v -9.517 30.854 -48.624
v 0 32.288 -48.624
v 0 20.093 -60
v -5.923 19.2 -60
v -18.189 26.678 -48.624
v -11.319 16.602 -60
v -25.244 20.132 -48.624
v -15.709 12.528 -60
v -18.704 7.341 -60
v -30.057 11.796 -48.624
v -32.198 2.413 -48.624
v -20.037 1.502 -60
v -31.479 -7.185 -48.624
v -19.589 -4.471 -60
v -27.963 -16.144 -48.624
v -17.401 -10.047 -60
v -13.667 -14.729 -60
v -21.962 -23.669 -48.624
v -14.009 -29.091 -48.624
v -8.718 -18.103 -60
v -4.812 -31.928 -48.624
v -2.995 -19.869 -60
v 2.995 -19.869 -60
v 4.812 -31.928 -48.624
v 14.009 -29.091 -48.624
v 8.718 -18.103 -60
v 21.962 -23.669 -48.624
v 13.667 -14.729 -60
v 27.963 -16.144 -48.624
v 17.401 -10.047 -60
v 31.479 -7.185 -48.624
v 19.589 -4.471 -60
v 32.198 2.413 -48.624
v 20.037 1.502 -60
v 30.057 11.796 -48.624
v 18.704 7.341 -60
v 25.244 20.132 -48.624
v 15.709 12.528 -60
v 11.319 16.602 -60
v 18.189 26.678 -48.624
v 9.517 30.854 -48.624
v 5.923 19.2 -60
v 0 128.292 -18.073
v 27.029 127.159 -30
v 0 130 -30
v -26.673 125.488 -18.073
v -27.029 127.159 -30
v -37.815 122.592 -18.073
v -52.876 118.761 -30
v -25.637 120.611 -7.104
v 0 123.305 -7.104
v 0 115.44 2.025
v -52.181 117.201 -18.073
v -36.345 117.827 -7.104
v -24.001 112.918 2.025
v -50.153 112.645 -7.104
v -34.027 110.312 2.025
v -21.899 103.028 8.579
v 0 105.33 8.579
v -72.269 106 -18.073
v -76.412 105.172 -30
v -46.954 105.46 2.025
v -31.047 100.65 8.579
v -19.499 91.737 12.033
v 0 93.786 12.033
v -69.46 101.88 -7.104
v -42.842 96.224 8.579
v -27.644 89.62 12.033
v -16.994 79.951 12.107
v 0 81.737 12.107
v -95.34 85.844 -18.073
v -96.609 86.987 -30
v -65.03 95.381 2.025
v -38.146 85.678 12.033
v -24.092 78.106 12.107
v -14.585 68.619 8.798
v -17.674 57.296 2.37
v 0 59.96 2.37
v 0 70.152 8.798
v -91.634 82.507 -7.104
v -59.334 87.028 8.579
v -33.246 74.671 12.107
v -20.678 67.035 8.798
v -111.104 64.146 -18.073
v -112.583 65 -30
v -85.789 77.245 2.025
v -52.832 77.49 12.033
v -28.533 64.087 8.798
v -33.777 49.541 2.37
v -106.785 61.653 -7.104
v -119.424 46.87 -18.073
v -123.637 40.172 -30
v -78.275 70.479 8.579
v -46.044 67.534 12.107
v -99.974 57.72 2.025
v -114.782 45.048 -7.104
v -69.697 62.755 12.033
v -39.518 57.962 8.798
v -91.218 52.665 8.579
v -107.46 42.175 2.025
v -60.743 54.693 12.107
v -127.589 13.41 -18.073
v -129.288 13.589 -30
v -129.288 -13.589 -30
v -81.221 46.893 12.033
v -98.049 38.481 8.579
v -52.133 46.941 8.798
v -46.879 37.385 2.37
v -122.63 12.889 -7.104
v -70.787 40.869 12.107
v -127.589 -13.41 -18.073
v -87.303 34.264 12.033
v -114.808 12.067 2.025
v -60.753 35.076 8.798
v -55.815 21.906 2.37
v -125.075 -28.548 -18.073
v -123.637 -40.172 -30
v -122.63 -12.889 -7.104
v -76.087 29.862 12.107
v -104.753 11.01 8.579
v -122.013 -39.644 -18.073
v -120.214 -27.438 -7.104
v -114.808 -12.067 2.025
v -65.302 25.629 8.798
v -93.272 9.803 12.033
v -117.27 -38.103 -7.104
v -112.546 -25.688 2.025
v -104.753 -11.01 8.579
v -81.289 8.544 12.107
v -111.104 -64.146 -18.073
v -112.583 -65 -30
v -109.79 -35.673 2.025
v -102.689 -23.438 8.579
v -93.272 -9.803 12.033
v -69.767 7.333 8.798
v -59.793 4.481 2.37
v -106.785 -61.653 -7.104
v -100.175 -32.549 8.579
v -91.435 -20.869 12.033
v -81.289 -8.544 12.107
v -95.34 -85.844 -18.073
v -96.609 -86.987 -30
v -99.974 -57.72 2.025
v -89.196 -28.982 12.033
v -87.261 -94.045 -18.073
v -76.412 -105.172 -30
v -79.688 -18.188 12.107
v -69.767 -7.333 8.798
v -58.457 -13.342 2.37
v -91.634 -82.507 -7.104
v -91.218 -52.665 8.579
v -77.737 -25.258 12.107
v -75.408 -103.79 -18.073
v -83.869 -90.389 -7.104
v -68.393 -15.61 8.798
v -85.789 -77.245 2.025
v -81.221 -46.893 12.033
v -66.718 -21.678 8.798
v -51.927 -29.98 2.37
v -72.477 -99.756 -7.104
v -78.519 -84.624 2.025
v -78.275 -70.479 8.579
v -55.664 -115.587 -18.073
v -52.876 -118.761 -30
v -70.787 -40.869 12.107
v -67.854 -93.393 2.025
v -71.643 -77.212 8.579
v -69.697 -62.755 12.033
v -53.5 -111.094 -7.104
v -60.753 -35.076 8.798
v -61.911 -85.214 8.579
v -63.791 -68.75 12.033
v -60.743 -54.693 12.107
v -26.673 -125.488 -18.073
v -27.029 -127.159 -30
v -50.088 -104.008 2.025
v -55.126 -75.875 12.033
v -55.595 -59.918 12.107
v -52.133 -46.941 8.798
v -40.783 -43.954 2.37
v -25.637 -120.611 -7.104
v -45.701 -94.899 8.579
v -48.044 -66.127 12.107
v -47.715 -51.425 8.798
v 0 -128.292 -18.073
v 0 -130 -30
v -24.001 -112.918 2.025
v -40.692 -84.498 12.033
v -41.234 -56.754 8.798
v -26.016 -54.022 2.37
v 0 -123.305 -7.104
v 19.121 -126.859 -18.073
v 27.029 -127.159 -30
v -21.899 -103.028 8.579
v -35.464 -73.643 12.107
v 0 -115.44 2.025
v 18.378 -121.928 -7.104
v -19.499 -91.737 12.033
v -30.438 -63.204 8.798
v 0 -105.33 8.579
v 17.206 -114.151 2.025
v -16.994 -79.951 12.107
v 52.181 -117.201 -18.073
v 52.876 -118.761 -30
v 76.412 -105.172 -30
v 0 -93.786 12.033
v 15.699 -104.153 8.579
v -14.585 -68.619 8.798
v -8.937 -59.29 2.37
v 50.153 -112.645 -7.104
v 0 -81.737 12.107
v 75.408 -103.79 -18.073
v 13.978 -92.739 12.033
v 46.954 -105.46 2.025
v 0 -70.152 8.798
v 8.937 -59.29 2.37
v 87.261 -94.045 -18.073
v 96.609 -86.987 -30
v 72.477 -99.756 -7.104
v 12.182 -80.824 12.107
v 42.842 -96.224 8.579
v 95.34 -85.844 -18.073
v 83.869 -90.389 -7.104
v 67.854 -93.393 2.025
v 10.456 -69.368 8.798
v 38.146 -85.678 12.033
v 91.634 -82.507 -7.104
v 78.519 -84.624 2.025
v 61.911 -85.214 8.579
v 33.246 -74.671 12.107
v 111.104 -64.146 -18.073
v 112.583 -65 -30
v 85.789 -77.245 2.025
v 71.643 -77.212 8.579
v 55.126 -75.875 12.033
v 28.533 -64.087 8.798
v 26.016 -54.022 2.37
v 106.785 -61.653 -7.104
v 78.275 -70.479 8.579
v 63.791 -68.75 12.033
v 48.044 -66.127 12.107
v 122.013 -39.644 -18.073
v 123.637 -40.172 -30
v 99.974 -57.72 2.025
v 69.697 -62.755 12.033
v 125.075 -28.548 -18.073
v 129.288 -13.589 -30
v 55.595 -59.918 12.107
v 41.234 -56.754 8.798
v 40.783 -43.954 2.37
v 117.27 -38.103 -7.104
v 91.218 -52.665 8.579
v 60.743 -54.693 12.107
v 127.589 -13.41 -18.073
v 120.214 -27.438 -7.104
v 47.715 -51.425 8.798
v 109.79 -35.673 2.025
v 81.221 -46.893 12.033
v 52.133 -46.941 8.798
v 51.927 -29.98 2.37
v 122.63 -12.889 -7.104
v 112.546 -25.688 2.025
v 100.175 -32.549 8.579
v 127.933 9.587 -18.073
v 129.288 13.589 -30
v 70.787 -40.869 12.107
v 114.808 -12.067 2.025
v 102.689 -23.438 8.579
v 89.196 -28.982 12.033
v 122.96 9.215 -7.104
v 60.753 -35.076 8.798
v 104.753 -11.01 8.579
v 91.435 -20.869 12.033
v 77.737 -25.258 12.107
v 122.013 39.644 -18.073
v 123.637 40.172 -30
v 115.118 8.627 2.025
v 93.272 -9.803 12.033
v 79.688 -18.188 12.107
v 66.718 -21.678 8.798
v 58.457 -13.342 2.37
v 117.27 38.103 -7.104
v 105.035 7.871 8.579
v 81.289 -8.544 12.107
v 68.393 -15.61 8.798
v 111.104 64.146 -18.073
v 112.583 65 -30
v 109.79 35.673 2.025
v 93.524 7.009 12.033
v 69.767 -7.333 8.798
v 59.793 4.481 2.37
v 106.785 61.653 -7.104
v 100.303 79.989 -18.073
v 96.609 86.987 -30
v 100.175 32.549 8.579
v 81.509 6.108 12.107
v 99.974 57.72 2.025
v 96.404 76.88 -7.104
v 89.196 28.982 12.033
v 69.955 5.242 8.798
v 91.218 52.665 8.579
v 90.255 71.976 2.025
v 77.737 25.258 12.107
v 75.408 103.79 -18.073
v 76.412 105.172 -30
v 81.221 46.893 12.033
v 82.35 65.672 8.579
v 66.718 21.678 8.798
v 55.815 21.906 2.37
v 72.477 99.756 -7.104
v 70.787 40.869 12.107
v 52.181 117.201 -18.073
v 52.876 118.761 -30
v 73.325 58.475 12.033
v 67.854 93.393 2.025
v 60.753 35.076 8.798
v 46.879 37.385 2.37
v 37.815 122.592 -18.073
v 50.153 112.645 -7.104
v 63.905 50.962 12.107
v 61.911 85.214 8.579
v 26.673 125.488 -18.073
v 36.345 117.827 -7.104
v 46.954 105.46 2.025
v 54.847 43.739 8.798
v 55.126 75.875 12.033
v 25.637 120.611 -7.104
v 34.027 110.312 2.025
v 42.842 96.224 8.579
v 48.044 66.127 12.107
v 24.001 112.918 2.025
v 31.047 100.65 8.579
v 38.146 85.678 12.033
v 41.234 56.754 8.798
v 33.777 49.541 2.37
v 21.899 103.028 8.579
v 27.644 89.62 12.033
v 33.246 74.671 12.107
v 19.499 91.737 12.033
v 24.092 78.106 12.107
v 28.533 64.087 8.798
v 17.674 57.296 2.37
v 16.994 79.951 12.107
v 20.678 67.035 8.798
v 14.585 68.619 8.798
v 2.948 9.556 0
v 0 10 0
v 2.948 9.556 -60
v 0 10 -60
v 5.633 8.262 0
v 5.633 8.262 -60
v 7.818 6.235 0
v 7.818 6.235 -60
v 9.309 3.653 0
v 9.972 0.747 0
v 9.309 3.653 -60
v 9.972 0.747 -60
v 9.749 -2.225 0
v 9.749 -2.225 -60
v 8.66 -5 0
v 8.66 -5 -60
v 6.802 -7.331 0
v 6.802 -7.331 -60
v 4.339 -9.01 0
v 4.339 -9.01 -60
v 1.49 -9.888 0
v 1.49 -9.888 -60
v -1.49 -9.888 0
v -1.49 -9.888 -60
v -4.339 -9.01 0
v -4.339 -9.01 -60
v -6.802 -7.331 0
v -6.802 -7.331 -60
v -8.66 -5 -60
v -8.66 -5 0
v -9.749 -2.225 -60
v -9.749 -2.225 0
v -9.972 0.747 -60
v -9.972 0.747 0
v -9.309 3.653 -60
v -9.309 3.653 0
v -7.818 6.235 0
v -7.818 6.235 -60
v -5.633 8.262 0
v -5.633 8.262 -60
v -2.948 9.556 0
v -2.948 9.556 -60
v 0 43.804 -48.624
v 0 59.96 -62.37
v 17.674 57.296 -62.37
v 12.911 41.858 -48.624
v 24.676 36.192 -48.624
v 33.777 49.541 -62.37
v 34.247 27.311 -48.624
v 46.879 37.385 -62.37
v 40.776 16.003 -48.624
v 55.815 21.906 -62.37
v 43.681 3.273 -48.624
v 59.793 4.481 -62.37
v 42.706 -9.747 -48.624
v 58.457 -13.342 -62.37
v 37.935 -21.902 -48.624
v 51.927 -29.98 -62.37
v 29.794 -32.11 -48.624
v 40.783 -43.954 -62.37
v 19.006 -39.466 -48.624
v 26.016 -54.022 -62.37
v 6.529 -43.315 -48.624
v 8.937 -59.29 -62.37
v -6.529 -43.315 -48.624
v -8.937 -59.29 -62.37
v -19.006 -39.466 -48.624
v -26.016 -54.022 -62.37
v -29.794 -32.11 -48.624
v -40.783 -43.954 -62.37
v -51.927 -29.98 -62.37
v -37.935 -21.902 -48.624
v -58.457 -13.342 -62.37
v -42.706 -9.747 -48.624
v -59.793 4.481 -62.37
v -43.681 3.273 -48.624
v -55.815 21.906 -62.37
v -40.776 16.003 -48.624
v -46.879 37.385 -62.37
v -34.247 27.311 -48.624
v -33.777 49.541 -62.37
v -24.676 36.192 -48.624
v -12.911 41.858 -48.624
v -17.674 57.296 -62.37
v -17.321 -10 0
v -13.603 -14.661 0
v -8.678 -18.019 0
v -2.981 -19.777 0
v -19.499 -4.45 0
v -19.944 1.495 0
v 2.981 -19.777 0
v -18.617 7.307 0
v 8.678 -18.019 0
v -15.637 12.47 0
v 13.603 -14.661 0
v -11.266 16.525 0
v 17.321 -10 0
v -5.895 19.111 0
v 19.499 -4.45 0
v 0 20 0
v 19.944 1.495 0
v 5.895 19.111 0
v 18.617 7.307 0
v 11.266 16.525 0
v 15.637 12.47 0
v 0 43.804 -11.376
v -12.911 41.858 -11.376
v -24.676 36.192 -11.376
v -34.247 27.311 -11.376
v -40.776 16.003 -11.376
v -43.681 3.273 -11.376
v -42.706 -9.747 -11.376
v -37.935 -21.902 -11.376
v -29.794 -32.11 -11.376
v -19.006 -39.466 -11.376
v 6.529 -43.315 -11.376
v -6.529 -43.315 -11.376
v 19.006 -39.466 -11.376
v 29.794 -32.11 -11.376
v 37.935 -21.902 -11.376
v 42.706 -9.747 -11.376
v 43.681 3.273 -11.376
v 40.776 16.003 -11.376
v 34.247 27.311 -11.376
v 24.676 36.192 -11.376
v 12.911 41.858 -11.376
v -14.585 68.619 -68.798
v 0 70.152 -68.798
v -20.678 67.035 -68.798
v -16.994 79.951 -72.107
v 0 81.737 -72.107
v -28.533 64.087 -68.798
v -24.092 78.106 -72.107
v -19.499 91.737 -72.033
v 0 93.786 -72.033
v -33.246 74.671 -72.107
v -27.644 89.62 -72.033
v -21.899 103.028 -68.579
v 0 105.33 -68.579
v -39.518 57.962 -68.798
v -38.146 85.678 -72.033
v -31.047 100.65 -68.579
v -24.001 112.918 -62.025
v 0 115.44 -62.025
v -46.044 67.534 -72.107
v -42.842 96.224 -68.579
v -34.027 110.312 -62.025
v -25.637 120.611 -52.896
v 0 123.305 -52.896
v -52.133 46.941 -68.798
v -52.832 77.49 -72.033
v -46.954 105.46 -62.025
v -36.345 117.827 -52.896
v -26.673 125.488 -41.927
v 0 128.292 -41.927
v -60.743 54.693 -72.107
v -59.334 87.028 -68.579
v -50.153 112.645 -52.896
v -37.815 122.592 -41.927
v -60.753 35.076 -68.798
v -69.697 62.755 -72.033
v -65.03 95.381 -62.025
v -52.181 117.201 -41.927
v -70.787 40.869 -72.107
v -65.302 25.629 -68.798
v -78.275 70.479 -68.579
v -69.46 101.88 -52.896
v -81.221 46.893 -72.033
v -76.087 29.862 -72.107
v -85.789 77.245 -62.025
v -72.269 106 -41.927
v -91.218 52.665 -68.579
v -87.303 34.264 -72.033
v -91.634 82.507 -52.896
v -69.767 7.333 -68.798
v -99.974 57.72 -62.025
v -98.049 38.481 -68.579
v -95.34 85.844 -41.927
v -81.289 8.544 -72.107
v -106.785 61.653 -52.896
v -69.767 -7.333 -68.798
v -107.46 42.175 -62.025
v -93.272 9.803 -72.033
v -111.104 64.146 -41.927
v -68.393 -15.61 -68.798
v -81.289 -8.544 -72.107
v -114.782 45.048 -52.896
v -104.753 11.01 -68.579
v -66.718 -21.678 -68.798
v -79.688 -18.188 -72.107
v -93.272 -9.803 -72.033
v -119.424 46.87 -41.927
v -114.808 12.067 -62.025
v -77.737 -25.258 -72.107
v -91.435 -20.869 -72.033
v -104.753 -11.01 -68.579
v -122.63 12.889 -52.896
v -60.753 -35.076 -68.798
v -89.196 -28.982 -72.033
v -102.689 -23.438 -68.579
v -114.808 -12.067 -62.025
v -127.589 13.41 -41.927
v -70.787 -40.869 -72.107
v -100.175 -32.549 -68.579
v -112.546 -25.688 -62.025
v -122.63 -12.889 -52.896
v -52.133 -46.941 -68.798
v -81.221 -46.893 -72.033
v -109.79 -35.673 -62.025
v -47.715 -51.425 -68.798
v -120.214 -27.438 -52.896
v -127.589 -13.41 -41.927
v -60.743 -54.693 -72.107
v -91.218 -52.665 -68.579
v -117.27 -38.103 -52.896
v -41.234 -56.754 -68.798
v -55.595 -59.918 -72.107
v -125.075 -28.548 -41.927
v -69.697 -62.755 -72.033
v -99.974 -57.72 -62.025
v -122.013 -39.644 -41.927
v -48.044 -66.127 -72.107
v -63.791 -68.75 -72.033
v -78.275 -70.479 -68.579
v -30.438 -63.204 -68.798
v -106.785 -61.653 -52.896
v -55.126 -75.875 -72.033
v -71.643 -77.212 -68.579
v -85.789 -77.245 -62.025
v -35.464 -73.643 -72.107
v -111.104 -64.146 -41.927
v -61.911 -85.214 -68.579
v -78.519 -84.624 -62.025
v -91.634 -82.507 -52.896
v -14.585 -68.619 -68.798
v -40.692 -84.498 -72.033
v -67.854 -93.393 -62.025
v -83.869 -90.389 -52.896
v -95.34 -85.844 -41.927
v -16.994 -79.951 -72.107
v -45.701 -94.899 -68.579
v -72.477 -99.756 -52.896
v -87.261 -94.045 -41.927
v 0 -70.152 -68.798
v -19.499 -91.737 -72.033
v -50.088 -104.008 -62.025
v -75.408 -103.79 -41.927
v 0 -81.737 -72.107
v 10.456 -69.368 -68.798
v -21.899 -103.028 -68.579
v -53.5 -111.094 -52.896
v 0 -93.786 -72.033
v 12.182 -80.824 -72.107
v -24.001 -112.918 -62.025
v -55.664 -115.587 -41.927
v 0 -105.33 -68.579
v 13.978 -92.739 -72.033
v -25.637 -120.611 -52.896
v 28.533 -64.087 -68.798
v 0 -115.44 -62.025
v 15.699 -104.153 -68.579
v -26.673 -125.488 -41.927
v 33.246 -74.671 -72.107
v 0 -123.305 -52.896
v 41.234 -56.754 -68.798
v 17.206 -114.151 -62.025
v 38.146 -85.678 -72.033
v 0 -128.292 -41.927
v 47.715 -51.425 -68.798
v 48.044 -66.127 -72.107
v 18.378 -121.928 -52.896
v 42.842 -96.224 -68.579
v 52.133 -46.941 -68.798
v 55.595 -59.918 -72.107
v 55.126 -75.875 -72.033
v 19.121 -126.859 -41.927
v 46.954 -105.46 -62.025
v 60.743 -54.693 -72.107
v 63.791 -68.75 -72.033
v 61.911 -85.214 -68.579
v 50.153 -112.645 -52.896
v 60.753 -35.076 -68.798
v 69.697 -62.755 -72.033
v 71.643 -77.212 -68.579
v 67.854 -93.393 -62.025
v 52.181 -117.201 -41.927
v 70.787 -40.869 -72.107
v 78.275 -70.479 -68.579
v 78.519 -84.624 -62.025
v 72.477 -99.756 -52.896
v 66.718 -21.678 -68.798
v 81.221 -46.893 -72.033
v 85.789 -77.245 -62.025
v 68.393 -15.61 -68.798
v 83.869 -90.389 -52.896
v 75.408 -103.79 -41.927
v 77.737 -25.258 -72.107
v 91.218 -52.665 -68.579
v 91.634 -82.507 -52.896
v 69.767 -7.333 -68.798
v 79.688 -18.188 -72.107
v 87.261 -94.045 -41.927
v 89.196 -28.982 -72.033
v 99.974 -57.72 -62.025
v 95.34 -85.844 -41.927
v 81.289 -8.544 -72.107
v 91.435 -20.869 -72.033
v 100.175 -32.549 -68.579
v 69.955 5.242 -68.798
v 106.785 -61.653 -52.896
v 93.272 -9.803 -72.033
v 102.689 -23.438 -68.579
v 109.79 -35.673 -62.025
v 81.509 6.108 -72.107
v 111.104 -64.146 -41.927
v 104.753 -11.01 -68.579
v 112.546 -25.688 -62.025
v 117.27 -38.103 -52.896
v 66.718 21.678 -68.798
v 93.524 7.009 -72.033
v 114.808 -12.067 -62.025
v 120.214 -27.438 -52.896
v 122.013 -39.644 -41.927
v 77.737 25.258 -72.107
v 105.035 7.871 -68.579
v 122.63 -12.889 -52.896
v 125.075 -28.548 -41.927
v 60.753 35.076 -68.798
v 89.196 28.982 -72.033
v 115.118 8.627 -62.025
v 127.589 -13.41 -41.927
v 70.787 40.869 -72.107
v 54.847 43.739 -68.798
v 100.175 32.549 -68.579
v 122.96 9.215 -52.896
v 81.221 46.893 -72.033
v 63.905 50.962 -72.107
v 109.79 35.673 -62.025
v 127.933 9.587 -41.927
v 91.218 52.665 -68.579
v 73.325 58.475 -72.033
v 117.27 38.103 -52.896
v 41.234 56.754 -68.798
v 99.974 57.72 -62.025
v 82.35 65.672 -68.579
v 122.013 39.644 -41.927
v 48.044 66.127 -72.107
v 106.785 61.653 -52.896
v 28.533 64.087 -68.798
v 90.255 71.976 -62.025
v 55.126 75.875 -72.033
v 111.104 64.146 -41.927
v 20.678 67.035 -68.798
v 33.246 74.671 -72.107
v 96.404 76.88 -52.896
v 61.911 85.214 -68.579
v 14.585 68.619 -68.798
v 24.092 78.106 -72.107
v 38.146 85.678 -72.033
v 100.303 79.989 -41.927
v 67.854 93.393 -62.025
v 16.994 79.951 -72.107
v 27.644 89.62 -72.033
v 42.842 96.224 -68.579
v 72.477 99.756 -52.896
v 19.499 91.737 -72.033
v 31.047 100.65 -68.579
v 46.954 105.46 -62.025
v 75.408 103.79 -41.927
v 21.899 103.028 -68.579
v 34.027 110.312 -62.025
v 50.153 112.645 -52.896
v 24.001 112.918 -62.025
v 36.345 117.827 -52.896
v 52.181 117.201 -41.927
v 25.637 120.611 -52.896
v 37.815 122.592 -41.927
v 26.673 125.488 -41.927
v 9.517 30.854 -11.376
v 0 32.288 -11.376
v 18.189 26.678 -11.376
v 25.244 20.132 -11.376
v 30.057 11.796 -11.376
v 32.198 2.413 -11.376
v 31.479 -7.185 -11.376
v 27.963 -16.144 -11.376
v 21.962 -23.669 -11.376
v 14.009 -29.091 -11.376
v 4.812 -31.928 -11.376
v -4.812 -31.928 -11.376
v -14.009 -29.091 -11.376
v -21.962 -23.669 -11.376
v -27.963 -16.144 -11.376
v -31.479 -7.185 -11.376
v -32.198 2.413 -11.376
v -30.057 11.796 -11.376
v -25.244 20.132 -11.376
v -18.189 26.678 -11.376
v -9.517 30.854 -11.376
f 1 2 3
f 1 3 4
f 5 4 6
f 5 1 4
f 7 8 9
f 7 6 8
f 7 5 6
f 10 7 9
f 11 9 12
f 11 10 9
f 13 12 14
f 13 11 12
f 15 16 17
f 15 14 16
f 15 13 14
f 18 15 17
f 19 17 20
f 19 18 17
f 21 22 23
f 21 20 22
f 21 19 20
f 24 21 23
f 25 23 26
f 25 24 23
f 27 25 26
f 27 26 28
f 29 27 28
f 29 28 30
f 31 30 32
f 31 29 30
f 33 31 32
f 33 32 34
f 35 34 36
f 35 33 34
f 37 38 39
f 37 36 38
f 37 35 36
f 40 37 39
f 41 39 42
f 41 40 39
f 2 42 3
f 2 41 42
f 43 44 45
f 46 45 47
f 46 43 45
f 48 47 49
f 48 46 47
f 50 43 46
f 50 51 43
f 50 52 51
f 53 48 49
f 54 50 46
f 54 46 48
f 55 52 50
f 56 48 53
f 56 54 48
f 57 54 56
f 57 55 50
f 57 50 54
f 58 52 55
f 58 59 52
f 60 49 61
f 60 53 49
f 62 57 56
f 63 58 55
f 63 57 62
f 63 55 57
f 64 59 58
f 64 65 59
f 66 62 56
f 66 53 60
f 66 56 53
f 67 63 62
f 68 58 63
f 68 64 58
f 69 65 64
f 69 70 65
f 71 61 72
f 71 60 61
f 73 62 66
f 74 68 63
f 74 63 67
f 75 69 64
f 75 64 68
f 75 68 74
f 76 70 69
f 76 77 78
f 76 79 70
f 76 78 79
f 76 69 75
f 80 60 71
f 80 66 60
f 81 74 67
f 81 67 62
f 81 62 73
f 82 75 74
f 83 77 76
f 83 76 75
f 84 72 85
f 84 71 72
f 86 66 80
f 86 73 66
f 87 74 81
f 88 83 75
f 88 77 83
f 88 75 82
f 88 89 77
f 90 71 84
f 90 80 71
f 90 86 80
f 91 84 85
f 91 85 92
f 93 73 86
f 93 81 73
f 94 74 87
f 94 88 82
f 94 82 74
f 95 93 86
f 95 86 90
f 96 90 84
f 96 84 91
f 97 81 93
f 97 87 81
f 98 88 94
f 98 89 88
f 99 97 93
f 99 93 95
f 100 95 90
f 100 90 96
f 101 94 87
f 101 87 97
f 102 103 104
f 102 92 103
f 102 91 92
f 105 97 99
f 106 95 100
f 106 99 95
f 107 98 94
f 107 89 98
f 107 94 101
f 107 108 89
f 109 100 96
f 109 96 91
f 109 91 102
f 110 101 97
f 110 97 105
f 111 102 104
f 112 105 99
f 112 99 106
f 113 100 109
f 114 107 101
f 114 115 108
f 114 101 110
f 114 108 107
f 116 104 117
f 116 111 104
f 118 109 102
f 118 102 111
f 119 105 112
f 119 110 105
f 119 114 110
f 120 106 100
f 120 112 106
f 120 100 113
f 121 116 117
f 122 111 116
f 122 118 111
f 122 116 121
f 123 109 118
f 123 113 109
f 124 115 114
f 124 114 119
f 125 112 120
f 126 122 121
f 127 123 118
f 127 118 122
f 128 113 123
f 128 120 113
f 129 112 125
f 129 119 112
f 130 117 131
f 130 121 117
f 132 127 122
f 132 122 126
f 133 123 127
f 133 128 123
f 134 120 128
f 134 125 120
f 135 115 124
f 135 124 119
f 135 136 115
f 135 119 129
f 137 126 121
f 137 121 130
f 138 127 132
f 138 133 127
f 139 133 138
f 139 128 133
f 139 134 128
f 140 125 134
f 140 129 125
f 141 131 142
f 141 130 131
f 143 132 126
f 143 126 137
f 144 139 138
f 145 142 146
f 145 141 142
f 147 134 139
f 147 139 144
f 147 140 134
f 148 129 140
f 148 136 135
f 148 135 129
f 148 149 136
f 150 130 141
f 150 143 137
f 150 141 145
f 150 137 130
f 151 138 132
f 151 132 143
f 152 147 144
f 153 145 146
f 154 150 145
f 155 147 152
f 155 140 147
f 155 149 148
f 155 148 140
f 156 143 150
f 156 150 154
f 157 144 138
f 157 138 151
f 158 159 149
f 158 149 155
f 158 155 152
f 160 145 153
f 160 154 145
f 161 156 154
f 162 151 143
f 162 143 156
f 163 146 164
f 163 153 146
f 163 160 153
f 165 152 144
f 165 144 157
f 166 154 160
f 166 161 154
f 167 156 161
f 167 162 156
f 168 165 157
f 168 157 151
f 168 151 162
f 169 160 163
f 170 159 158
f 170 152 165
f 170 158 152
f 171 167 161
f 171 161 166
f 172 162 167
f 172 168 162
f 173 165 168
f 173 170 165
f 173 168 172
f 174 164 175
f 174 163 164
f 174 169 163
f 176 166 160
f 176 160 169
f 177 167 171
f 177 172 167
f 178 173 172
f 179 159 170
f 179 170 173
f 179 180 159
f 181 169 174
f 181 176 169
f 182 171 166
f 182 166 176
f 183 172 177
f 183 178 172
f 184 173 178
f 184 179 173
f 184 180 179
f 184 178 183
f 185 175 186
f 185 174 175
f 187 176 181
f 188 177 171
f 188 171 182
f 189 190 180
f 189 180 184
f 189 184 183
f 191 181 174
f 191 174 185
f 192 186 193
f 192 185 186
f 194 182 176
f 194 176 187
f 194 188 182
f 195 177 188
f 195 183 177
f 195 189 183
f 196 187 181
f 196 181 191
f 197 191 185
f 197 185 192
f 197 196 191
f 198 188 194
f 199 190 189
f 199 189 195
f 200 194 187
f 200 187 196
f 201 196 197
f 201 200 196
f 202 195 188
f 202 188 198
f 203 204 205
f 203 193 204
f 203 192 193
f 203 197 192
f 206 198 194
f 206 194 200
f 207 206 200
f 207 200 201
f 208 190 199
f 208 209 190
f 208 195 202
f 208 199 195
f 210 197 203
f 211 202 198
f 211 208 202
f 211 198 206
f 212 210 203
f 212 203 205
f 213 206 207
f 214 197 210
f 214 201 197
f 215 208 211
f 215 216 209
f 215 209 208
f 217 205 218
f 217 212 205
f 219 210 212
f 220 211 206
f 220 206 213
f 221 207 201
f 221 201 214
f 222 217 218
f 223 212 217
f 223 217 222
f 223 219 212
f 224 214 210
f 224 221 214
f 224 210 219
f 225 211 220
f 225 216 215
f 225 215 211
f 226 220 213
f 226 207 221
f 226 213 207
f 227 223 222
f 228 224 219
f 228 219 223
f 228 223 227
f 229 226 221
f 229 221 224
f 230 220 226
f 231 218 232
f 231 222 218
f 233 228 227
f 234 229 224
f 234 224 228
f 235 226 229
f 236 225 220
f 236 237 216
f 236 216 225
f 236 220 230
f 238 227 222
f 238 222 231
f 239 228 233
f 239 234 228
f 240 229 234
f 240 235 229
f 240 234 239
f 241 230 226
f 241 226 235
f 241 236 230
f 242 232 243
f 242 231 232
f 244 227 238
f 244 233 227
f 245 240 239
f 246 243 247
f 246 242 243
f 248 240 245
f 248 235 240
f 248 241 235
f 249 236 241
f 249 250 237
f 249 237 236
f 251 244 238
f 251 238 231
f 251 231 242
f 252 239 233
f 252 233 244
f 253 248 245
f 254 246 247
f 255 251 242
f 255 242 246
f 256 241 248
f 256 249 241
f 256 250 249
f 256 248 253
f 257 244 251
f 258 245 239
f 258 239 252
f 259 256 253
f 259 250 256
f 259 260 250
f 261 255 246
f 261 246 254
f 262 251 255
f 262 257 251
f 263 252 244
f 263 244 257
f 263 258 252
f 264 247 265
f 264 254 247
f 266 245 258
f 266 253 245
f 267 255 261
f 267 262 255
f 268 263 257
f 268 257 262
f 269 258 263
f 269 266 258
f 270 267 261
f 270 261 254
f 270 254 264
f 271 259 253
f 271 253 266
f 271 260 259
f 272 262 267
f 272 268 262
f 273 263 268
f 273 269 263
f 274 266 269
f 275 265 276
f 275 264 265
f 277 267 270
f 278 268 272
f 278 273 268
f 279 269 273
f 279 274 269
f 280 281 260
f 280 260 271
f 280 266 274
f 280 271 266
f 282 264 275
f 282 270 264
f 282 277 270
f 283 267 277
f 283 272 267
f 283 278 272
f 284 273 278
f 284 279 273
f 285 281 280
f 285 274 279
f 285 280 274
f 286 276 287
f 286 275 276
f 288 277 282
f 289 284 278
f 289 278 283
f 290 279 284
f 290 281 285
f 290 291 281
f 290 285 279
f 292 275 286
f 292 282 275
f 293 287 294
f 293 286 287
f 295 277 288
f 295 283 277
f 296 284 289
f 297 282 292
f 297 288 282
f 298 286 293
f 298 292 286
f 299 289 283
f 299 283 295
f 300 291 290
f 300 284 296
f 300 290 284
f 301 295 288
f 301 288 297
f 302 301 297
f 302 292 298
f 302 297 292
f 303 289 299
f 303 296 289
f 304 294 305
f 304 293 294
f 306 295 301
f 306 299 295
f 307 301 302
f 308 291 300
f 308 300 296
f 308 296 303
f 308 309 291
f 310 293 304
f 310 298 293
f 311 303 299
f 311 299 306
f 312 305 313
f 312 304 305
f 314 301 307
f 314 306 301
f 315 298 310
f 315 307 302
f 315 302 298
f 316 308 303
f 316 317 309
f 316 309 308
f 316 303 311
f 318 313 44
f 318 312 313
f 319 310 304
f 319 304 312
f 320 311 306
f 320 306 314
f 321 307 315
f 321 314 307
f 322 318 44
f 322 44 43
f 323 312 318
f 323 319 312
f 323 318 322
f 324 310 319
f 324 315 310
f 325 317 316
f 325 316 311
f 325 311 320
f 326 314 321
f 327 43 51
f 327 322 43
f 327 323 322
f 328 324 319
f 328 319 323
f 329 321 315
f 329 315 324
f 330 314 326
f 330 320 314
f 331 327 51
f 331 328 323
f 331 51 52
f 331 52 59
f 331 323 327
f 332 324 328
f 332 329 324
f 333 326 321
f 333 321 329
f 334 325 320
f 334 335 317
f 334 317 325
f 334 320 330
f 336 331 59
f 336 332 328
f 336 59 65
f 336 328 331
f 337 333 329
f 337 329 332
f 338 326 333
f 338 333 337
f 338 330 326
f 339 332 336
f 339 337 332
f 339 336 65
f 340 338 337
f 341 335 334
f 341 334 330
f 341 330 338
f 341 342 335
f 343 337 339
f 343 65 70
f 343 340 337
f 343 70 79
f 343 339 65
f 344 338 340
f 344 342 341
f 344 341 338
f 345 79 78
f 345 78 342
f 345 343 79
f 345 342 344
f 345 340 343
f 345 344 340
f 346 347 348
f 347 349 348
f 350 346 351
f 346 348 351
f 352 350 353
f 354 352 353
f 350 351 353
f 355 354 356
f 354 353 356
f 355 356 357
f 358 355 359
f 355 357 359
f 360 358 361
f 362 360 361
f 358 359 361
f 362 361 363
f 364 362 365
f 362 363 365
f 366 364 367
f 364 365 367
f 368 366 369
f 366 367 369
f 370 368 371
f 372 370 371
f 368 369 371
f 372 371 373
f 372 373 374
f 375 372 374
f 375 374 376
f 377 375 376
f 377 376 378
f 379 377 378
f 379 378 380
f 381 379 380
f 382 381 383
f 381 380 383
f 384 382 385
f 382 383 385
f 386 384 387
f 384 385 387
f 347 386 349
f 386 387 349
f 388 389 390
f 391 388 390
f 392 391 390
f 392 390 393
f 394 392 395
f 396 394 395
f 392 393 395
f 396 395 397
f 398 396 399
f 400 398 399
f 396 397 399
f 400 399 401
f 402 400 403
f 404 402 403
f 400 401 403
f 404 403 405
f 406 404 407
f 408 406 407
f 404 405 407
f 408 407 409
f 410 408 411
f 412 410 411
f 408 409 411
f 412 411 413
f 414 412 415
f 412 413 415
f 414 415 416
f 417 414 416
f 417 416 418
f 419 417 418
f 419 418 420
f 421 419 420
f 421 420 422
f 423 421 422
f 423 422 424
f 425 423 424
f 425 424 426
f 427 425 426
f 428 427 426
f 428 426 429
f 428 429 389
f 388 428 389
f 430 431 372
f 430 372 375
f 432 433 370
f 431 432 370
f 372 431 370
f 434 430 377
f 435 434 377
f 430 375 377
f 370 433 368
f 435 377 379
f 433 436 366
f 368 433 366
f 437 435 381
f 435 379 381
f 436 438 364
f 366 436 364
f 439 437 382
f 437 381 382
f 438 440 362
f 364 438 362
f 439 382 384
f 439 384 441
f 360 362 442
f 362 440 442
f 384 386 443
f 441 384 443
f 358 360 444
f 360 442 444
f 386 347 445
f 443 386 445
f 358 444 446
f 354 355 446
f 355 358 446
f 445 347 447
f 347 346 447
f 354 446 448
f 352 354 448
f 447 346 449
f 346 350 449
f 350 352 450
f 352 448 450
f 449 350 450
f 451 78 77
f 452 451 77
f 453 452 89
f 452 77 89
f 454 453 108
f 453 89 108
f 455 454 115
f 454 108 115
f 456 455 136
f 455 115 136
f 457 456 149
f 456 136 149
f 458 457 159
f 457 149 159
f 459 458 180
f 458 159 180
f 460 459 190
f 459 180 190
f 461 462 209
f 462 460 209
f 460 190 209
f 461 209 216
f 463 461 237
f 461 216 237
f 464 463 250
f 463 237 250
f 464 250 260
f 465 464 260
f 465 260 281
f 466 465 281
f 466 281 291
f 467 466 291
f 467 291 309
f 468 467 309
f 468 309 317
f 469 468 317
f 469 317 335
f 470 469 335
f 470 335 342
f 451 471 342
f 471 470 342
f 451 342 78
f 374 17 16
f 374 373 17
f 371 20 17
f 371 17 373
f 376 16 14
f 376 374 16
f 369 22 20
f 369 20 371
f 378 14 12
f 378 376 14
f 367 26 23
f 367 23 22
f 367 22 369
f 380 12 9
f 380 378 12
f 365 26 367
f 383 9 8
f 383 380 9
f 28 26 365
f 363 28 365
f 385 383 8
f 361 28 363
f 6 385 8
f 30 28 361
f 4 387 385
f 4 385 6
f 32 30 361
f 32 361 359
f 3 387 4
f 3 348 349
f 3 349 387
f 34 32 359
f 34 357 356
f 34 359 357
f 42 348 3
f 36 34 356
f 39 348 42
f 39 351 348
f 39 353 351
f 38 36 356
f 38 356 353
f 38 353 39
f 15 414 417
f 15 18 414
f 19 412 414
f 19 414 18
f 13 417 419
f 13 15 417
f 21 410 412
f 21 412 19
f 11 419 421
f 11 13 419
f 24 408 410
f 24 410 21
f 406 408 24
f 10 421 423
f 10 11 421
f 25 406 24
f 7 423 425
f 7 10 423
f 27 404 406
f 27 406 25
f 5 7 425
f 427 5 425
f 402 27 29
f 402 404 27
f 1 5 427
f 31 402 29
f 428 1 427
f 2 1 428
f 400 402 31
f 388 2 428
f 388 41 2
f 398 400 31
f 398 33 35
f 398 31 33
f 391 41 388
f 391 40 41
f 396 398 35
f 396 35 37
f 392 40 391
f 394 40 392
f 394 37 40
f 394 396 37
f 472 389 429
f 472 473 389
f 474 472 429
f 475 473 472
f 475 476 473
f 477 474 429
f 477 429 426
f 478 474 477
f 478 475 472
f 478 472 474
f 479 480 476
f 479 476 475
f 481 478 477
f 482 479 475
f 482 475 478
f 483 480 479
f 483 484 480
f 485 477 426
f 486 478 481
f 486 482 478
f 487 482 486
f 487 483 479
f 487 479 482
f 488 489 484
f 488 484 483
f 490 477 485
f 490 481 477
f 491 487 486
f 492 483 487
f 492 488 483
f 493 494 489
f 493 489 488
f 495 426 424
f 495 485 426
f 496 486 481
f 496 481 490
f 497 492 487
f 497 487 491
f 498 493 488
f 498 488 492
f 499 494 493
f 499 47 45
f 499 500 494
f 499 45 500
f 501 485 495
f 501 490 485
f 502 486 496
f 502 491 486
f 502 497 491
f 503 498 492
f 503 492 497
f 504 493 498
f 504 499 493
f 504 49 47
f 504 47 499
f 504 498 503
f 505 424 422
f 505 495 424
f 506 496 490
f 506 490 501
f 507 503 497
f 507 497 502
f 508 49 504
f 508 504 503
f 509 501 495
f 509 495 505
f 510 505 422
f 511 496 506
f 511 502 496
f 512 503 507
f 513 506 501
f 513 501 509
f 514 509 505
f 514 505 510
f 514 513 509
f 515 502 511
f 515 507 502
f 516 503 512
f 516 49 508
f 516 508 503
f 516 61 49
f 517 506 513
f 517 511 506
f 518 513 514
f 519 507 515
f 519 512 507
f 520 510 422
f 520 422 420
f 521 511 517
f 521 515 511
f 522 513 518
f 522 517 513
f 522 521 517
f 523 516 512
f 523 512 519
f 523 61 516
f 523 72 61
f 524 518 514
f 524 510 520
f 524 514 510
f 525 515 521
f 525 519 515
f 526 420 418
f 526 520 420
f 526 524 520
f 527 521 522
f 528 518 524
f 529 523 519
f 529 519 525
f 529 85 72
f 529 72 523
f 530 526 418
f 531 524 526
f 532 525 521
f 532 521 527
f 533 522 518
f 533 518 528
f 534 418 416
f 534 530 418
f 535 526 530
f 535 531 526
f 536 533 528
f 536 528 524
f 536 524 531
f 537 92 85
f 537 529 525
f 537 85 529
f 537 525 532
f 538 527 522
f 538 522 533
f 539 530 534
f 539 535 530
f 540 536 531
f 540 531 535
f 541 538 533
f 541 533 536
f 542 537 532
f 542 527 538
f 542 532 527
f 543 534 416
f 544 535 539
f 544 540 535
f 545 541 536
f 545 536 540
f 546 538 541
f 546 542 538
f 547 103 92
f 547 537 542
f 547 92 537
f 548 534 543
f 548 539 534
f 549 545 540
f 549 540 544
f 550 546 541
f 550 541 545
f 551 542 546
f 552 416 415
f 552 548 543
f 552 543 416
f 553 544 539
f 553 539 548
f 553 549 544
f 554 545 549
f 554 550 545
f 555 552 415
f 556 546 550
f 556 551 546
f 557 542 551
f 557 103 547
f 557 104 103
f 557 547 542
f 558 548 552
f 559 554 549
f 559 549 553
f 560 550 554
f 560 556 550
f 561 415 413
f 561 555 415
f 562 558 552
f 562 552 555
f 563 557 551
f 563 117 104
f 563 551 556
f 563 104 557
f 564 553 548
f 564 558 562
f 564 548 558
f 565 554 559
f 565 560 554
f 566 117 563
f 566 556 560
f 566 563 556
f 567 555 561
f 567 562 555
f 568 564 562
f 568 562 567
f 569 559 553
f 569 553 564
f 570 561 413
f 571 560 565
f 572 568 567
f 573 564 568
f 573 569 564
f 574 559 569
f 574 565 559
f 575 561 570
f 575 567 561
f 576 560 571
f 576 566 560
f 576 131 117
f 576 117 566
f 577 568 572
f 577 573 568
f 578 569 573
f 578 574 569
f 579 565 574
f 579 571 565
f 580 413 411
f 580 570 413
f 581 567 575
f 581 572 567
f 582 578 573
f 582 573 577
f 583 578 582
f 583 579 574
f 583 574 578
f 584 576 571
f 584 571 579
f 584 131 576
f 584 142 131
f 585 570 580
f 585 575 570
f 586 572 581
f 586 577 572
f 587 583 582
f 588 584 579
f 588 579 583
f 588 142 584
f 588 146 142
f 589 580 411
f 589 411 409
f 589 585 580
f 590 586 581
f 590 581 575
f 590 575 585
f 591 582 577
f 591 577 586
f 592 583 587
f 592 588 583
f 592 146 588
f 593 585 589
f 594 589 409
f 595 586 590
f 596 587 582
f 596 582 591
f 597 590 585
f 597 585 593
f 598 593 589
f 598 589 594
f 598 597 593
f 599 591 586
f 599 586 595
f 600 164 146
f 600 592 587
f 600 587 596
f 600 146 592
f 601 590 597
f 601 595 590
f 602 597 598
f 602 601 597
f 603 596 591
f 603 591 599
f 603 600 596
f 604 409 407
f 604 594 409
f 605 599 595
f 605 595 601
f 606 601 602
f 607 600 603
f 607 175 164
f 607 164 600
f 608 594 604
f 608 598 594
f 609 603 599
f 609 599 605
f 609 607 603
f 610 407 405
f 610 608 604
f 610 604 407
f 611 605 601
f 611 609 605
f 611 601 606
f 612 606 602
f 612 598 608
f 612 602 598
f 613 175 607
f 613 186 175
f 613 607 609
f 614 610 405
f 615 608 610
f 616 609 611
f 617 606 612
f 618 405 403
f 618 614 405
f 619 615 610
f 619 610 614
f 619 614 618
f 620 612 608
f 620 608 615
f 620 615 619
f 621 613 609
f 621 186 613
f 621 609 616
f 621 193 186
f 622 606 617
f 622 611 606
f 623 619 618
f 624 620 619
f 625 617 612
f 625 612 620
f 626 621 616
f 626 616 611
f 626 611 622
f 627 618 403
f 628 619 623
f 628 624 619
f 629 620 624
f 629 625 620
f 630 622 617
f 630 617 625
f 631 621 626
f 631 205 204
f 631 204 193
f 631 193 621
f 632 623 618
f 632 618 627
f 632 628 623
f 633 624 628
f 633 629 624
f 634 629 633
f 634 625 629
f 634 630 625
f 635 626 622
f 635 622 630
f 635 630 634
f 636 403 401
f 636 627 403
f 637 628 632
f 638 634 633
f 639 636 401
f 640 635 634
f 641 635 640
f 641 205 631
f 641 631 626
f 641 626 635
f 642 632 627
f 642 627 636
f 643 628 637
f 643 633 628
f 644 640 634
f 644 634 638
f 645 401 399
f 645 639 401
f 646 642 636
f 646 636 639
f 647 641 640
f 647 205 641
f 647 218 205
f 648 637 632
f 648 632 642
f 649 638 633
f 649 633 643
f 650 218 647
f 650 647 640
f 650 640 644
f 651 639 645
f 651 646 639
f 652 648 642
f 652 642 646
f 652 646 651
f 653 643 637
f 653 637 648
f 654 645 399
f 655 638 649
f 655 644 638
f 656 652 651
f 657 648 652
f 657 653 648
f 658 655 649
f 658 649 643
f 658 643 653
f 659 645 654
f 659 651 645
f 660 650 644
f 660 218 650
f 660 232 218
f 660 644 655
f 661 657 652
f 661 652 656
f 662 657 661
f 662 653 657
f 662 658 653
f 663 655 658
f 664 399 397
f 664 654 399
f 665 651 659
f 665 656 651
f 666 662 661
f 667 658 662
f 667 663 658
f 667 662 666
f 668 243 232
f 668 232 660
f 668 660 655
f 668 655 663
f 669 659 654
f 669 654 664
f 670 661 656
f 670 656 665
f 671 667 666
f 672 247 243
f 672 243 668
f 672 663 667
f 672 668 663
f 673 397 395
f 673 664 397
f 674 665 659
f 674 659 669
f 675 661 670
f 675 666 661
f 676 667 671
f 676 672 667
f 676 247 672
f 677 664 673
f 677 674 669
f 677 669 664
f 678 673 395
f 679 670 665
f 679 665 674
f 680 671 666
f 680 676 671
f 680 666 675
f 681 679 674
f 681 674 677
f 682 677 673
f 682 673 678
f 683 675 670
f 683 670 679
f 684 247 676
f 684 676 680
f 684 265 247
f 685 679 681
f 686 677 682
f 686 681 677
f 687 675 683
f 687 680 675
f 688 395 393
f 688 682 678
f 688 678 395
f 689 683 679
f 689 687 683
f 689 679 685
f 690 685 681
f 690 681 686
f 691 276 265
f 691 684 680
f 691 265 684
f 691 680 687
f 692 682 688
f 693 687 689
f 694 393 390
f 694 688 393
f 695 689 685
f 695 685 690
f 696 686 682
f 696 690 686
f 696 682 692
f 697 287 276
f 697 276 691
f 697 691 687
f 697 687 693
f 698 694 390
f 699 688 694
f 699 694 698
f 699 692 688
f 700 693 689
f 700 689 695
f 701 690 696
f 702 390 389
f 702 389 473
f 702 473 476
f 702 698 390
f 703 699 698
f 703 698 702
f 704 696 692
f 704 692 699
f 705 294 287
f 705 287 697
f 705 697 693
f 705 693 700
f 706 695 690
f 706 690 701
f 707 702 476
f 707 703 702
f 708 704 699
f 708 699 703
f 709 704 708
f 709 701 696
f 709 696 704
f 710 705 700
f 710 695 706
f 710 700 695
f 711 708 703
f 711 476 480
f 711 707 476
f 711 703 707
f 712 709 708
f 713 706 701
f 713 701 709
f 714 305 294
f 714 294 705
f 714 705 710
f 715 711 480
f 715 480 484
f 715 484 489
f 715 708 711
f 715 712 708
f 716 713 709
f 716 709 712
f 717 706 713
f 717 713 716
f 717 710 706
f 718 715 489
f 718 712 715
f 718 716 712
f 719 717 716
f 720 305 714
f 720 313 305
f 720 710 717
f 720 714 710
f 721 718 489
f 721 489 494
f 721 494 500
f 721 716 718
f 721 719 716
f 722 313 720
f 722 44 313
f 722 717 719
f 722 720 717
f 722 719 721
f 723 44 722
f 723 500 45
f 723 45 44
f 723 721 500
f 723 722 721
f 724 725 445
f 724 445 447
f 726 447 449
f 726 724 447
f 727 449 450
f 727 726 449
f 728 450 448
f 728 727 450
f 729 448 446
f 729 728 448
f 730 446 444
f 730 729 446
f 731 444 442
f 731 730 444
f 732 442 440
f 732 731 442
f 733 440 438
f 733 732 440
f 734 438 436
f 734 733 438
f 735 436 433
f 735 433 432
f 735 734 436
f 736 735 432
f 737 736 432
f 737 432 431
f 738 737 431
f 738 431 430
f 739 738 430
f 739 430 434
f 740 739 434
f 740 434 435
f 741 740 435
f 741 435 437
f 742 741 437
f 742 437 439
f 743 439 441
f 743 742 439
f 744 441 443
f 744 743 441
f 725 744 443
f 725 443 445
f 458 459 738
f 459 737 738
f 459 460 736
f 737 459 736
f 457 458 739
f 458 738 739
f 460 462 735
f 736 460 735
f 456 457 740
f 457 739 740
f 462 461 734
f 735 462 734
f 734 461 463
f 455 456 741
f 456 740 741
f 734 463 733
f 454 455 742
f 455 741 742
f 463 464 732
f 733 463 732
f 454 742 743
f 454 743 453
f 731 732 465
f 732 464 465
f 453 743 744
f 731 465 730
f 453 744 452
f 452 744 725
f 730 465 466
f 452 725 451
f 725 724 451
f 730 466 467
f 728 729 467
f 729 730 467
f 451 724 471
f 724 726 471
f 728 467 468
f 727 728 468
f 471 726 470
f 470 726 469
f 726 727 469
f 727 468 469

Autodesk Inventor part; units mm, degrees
ref_plane "YZ Plane" through (0, 0, 0) normal (1, 0, 0) x (0, 1, 0)
ref_plane "XZ Plane" through (0, 0, 0) normal (0, 1, 0) x (-1, 0, 0)
ref_plane "XY Plane" through (0, 0, 0) normal (0, 0, 1) x (1, 0, 0)
sketch "Skizze1" plane through (0, 0, 0) normal (1, 0, 0) x (0, 1, 0)
  line L0 (0, 0) -> (0, -60)
  line L1 (0, 0) -> (10, 0)
  line L2 (10, 0) -> (10, -60)
  line L3 (10, -60) -> (0, -60)
  line L4 (10, -60) -> (10, -60)
  line L5 (10, -60) -> (10, -8.2526)
  line L6 (10, -8.2526) -> (10, 0)
  line L7 (0, -30) -> (87.5, -30)
  circle A0 centre (87.5, -30) radius 42.5
  line L8 (10, 0) -> (20, 0)
  line L9 (10, -60) -> (20.0931, -60)
  line L10 (59.9602, 2.3699) -> (43.8038, -11.3757)
  line L11 (20, 0) -> (32.2885, -11.3757)
  line L12 (32.2885, -11.3757) -> (43.8038, -11.3757)
  line L13 (20.0931, -60) -> (32.2885, -48.6243)
  line L14 (32.2885, -48.6243) -> (43.8038, -48.6243)
  line L15 (43.8038, -48.6243) -> (59.9602, -62.3699)
  line L16 (38.0462, -11.3757) -> (38.0462, -48.6243)
  line L17 (130, -30) -> (87.5, -30)
  dimension "d0" = 20
  dimension "d1" = 60
  dimension "d2" = 85
  dimension "d4" = 260
  dimension "d5" = 40
revolve "Umdrehung1" add sketch "Skizze1" angle 360 about axis through (0, 0, 0) along (0, 0, -1) contours L8 L11 L12 L16 L7 L2 | L7 L16 L14 L13 L9 L2 | L16 L12 L10 A0 L7 | L7 A0 L15 L14 L16 | A0 L17 L7 | L7 L17 A0
properties part number "Wheel"
